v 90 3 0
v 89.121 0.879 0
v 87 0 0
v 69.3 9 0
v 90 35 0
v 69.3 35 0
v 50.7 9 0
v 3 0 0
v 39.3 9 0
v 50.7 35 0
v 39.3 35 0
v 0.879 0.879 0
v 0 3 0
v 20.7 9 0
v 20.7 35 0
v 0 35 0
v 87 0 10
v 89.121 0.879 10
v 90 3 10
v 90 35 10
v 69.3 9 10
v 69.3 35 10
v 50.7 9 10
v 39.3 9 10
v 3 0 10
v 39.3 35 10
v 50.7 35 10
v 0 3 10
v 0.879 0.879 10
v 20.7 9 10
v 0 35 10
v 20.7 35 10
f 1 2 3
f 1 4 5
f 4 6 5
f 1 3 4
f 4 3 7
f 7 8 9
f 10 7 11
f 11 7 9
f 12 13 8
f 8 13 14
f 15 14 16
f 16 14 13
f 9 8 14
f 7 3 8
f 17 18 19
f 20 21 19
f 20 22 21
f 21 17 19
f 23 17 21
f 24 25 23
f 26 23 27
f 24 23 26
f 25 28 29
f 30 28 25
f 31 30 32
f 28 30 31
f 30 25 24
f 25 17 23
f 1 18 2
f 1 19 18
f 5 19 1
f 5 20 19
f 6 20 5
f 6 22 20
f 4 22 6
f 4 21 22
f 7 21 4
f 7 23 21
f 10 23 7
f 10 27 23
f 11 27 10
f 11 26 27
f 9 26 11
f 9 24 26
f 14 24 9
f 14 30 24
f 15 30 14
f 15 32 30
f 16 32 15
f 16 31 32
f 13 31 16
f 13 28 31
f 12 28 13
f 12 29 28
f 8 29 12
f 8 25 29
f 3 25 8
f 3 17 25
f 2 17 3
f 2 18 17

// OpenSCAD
$fn = 32;

// ----------------------------------------------------------------------
// Window plate: 90 x 35 mm, 2 open windows
// ----------------------------------------------------------------------

// --- parameters (mm) ---
profile_height = 10;      // extrusion height
profile_points = 16;      // points of the closed outline

profile = [[0, 3], [0.879, 0.879], [3, 0], [87, 0], [89.121, 0.879], [90, 3], [90, 35], [69.3, 35], [69.3, 9], [50.7, 9], [50.7, 35], [39.3, 35], [39.3, 9], [20.7, 9], [20.7, 35], [0, 35]];  // single closed polygon, 16 points, counter clockwise

// --- the one profile operation ---
linear_extrude(height = profile_height) polygon(points = profile);
